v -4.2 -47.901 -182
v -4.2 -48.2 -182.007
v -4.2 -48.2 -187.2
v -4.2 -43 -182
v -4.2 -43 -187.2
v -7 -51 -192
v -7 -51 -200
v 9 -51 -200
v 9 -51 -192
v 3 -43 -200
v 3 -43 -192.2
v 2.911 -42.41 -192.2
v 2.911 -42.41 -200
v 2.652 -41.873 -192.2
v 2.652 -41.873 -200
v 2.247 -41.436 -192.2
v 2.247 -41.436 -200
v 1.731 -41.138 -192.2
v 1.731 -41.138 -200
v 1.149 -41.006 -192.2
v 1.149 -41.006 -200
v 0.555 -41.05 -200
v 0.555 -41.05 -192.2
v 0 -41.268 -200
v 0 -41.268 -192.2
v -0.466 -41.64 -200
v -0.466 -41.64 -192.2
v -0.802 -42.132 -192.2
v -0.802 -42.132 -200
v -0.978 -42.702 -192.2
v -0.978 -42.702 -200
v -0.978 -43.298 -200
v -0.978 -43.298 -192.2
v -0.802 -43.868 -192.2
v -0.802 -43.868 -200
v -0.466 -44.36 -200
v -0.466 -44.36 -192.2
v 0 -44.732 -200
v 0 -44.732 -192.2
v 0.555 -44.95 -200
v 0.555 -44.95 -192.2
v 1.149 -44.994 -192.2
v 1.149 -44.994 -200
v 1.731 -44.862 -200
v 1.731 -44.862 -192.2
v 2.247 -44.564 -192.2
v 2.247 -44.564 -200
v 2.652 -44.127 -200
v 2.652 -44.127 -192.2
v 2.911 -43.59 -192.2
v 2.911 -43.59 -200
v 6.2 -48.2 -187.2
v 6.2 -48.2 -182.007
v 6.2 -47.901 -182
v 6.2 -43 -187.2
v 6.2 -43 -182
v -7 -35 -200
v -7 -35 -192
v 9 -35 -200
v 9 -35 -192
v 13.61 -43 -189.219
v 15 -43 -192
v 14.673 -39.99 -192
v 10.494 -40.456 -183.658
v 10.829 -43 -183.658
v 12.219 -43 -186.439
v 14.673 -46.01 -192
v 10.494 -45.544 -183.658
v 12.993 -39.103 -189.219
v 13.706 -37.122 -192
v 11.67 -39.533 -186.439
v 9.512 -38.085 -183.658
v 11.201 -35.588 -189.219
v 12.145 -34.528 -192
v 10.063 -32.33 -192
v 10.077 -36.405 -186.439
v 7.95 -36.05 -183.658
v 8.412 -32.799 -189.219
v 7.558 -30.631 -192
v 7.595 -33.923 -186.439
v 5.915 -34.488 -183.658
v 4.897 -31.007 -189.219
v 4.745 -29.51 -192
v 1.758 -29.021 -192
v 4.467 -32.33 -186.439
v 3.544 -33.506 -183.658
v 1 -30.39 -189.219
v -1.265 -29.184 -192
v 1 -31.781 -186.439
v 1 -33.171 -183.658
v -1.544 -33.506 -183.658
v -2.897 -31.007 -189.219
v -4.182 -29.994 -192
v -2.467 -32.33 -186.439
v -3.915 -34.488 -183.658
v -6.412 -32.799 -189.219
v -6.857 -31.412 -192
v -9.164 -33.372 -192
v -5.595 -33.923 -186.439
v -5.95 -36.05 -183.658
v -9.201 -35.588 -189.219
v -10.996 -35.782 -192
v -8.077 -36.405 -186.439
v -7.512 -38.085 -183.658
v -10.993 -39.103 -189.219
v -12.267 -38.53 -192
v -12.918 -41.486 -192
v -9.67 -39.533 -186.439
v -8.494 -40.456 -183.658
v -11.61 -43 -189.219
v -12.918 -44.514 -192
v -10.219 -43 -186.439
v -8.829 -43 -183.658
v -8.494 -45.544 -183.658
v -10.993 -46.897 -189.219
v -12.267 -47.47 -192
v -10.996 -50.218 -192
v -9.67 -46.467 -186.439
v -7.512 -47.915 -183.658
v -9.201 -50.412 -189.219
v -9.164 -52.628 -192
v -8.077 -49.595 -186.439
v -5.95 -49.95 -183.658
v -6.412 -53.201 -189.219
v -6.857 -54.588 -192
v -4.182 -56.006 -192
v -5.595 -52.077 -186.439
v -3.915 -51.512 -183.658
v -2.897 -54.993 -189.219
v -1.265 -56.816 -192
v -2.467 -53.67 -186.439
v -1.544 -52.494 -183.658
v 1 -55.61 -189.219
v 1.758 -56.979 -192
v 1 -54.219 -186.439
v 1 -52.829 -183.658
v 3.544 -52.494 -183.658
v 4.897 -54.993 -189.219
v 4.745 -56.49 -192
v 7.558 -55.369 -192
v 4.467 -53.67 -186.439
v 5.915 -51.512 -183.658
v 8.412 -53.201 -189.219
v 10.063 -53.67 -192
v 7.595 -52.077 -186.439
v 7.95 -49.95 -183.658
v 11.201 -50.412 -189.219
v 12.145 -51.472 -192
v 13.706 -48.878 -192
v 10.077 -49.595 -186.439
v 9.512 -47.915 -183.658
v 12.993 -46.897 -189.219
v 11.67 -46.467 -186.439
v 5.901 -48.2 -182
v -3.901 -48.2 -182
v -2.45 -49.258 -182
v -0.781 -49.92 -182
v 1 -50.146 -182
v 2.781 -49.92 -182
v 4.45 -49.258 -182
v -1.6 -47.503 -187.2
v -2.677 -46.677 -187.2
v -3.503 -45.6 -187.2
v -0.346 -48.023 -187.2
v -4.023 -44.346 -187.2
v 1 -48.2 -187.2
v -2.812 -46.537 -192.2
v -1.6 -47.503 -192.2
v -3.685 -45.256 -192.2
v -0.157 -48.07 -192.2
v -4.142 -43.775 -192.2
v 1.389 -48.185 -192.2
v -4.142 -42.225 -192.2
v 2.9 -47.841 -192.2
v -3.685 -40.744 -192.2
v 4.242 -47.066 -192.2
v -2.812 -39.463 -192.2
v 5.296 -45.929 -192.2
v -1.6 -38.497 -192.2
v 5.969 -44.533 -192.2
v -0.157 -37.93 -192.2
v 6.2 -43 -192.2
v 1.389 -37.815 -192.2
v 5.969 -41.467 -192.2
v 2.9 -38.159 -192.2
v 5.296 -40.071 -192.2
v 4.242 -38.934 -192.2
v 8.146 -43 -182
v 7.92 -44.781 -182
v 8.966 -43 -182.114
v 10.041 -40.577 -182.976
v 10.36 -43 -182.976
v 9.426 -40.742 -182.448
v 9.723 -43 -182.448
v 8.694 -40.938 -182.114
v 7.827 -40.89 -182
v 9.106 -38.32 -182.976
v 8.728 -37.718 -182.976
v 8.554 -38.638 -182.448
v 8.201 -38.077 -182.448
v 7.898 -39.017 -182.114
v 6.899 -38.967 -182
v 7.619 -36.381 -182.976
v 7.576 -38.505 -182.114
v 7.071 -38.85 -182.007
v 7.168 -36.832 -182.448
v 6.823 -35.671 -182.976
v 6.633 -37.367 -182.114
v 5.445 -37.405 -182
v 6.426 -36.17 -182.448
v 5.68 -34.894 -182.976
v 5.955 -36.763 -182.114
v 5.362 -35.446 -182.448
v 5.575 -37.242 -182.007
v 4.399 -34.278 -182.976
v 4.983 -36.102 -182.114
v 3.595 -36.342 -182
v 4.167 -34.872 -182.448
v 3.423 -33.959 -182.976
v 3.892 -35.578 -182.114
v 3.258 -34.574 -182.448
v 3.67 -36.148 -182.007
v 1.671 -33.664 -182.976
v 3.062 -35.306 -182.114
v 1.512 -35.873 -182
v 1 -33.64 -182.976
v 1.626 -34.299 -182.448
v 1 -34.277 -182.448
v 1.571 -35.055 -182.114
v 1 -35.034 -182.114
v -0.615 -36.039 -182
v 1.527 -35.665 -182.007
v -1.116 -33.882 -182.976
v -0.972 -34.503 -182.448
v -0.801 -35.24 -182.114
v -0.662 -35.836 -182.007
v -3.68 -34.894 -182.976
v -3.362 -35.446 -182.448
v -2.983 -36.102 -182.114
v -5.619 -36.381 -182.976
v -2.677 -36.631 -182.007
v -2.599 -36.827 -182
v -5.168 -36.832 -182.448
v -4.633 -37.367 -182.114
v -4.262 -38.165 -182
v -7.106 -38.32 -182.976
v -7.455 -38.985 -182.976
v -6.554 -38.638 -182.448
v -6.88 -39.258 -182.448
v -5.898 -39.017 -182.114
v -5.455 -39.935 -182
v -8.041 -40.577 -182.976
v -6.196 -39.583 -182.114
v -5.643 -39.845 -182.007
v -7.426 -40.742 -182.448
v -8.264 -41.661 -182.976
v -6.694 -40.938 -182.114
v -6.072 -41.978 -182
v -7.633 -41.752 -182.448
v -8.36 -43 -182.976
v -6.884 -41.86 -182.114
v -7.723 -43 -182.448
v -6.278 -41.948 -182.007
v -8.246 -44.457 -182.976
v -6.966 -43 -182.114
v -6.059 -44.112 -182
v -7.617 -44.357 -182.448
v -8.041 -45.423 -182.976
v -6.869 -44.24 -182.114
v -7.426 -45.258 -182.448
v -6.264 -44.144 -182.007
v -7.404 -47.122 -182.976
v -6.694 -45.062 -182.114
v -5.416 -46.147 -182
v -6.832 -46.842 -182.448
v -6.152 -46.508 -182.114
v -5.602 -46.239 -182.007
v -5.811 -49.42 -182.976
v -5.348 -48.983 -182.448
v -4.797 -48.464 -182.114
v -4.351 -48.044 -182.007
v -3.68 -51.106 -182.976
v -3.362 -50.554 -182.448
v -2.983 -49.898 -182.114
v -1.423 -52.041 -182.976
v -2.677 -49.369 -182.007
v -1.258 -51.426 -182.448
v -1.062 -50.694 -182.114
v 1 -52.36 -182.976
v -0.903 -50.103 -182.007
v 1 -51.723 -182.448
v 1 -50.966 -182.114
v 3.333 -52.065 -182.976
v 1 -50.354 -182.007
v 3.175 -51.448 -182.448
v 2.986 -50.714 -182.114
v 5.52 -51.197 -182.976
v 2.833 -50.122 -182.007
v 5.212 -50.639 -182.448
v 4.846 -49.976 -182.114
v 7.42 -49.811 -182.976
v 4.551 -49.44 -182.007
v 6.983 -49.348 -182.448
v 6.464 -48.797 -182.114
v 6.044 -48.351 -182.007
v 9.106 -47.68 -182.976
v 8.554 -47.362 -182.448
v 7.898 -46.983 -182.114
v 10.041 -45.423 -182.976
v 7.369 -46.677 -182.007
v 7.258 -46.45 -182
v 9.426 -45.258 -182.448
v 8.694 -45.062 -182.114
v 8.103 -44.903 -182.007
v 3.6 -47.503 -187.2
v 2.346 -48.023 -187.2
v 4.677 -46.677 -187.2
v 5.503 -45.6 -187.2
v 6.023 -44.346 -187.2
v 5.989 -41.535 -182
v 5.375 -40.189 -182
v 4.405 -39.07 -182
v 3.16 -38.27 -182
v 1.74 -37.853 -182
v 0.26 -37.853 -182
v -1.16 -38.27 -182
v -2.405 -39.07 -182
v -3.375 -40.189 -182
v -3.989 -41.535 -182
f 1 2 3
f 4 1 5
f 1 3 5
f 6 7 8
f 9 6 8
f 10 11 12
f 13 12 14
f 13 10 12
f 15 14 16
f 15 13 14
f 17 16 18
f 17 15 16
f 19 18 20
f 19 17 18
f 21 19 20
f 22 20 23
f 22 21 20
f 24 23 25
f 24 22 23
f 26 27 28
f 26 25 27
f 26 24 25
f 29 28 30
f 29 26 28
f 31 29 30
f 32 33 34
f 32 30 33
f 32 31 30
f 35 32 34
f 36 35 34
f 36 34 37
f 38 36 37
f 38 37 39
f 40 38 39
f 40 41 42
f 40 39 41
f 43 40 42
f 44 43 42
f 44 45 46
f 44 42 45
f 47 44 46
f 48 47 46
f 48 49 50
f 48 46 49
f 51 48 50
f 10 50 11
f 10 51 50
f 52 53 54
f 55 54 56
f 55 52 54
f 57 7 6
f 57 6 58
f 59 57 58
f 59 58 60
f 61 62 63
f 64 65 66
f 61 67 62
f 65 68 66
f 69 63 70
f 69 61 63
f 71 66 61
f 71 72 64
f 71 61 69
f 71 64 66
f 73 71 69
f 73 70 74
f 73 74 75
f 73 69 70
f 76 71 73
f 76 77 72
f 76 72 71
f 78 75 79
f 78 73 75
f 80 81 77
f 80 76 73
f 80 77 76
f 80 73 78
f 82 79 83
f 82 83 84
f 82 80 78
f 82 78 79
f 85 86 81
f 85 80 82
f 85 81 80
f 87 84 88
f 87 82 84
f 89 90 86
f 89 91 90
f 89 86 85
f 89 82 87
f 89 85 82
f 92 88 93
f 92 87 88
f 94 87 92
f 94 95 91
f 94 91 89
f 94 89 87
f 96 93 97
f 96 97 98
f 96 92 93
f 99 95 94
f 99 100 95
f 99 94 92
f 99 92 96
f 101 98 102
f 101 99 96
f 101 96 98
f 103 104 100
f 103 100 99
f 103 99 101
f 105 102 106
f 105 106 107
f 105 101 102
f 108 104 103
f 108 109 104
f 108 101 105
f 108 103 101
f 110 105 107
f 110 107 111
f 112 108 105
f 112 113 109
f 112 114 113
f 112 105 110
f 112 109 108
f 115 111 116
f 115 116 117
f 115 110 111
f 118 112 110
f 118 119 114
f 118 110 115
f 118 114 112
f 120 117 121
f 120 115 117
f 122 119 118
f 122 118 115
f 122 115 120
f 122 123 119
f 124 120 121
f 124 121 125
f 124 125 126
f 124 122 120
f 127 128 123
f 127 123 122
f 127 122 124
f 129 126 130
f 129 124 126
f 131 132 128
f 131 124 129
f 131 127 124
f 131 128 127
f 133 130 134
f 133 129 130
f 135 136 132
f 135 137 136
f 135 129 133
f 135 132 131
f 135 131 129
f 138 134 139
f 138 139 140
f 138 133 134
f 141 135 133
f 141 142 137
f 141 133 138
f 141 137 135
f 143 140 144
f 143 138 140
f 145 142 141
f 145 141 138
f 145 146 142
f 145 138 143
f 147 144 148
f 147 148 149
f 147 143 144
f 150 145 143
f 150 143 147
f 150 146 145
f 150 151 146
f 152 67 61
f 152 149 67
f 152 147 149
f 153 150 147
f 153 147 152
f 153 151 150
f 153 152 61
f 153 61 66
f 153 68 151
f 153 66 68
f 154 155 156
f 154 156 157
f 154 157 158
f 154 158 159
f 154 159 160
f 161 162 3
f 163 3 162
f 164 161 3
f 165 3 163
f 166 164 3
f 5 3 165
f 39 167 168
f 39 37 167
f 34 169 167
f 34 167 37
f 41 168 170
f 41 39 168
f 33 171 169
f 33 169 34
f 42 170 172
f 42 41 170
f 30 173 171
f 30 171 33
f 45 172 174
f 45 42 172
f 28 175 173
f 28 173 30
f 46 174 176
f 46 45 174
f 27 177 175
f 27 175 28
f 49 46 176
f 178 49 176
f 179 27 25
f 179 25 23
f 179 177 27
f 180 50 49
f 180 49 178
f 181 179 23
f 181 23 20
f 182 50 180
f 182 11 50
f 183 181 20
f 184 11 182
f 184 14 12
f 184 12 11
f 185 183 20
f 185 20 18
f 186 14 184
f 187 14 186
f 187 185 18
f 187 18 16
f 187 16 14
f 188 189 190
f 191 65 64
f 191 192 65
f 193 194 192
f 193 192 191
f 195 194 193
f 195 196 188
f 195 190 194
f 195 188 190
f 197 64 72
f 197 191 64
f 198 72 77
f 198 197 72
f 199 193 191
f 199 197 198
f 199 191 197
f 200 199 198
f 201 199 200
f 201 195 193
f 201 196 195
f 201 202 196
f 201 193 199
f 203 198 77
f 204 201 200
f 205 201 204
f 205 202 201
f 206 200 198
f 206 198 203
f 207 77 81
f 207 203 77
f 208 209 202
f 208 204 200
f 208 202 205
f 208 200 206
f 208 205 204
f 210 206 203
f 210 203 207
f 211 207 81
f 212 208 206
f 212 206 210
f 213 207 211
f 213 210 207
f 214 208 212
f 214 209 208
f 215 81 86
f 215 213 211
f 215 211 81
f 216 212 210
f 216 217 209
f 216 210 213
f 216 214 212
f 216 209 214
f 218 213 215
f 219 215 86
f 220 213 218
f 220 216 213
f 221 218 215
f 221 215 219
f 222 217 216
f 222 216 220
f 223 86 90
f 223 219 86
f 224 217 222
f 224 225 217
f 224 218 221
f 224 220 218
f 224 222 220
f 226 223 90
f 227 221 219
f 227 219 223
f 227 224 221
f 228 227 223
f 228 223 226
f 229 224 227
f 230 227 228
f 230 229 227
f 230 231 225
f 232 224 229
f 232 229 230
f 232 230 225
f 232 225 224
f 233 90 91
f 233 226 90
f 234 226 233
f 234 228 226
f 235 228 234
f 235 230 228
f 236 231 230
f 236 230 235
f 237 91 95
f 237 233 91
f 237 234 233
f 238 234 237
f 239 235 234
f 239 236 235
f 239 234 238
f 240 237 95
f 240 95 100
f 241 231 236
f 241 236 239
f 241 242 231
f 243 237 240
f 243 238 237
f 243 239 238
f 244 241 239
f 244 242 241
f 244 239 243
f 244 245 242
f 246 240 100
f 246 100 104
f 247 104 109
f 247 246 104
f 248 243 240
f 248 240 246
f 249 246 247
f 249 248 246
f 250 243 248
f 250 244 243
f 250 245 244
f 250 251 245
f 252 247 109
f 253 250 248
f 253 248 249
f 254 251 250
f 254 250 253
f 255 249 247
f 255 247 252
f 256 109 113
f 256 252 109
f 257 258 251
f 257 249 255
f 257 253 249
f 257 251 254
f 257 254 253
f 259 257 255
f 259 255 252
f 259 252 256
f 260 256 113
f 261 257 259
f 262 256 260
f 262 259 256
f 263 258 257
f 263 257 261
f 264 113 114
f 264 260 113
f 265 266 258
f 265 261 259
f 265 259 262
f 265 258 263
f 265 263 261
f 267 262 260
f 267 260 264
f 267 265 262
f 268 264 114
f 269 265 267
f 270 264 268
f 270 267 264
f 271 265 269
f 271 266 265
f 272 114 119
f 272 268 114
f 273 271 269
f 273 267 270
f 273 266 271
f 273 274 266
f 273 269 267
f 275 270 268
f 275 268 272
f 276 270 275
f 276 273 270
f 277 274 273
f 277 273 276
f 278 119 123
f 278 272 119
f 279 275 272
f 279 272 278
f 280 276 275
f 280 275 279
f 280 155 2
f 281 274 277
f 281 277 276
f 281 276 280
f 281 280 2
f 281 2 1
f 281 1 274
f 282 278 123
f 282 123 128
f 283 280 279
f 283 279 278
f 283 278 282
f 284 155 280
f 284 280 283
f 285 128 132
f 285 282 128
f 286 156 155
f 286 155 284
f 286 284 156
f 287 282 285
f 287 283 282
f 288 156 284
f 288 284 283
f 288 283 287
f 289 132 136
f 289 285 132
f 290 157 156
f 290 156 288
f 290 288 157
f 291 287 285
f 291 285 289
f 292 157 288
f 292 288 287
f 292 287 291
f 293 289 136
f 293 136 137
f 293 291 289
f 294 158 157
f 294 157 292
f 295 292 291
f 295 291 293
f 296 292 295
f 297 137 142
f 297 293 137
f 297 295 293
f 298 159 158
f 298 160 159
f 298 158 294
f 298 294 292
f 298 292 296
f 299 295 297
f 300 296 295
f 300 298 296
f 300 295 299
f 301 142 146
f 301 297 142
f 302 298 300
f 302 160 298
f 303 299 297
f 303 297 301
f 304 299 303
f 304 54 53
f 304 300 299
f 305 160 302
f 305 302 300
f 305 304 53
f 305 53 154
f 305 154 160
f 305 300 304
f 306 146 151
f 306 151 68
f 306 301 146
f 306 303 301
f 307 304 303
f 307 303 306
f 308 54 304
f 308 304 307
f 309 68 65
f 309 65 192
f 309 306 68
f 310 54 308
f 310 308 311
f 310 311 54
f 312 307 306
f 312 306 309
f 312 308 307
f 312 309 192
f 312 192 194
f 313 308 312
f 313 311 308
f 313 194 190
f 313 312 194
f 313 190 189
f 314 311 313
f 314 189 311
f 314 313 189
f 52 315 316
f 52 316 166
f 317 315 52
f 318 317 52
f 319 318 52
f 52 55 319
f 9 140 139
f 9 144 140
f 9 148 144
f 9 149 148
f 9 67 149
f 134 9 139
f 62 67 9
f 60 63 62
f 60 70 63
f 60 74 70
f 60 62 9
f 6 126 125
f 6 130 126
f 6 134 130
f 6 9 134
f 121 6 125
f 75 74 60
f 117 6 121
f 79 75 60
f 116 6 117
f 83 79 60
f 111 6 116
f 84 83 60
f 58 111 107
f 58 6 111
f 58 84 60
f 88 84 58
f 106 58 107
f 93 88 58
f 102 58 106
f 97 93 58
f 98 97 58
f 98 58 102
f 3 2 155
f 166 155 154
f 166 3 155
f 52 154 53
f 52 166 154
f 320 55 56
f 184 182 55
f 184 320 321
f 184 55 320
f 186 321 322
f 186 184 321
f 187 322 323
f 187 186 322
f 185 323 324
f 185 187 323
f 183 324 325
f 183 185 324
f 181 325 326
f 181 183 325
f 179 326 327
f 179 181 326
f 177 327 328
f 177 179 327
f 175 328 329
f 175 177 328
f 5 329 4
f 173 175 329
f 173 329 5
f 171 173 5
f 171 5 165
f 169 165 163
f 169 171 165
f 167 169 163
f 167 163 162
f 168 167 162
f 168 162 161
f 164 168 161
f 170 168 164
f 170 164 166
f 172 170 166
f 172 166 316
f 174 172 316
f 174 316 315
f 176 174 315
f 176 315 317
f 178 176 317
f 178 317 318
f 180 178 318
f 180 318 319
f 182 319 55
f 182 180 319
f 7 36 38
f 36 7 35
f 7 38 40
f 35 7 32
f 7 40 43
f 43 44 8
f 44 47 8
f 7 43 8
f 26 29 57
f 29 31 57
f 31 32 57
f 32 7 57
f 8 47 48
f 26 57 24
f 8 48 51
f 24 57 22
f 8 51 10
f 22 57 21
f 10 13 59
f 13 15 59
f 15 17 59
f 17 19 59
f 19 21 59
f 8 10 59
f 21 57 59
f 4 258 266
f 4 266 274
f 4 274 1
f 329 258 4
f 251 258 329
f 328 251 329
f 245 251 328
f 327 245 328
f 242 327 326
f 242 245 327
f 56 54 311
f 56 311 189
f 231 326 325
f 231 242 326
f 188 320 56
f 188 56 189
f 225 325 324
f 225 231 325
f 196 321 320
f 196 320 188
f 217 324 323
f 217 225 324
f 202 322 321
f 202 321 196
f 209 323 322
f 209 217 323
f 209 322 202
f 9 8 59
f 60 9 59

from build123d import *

# Parameters (mm, degrees)
FILLET001_R       = 3
BOX005_W          = 10.4
BOX005_H          = 5.2
BOX005_DEPTH      = 5.2
BOX006_W          = 16
BOX006_H          = 16
BOX006_DEPTH      = 8
CYLINDER009_R     = 5.2
CYLINDER009_DEPTH = 10.2
CYLINDER010_R     = 2
CYLINDER010_DEPTH = 8


with BuildPart() as part:
    # Cone → Cone (revolve)
    with BuildSketch(Plane.XZ):
        Polygon((0, 0), (14, 0), (9, 10), (0, 10), align=None)
    revolve(axis=Axis((0, 0, 0), (0, 0, 1)))

    # Fillet001
    fillet001_edges = [part.edges().sort_by_distance(p)[0] for p in [
        (-9, 0, 10),
    ]]
    fillet(fillet001_edges, radius=FILLET001_R)

    # Box005 → Box005 (cut)
    with BuildSketch(Plane(origin=(-5.2, -5.2, 4.8), x_dir=(1, 0, 0), z_dir=(0, 0, 1))):
        with Locations((5.2, 2.6)):
            Rectangle(BOX005_W, BOX005_H)
    extrude(amount=BOX005_DEPTH, mode=Mode.SUBTRACT)

    # Box006 → Box006 (join)
    with BuildSketch(Plane(origin=(-8, -8, -8), x_dir=(1, 0, 0), z_dir=(0, 0, 1))):
        with Locations((8, 8)):
            Rectangle(BOX006_W, BOX006_H)
    extrude(amount=BOX006_DEPTH)

    # Cylinder009 → Cylinder009 (cut)
    with BuildSketch(Plane.XY.offset(-0.2)):
        Circle(CYLINDER009_R)
    extrude(amount=CYLINDER009_DEPTH, mode=Mode.SUBTRACT)

    # Cylinder010 → Cylinder010 (cut)
    with BuildSketch(Plane.XY.offset(-8)):
        Circle(CYLINDER010_R)
    extrude(amount=CYLINDER010_DEPTH, mode=Mode.SUBTRACT)


with BuildPart() as part_1:
    # Body005 placement: moved
    add(part.part.moved(Location((1, -43, -192))))


solid = part_1.part
